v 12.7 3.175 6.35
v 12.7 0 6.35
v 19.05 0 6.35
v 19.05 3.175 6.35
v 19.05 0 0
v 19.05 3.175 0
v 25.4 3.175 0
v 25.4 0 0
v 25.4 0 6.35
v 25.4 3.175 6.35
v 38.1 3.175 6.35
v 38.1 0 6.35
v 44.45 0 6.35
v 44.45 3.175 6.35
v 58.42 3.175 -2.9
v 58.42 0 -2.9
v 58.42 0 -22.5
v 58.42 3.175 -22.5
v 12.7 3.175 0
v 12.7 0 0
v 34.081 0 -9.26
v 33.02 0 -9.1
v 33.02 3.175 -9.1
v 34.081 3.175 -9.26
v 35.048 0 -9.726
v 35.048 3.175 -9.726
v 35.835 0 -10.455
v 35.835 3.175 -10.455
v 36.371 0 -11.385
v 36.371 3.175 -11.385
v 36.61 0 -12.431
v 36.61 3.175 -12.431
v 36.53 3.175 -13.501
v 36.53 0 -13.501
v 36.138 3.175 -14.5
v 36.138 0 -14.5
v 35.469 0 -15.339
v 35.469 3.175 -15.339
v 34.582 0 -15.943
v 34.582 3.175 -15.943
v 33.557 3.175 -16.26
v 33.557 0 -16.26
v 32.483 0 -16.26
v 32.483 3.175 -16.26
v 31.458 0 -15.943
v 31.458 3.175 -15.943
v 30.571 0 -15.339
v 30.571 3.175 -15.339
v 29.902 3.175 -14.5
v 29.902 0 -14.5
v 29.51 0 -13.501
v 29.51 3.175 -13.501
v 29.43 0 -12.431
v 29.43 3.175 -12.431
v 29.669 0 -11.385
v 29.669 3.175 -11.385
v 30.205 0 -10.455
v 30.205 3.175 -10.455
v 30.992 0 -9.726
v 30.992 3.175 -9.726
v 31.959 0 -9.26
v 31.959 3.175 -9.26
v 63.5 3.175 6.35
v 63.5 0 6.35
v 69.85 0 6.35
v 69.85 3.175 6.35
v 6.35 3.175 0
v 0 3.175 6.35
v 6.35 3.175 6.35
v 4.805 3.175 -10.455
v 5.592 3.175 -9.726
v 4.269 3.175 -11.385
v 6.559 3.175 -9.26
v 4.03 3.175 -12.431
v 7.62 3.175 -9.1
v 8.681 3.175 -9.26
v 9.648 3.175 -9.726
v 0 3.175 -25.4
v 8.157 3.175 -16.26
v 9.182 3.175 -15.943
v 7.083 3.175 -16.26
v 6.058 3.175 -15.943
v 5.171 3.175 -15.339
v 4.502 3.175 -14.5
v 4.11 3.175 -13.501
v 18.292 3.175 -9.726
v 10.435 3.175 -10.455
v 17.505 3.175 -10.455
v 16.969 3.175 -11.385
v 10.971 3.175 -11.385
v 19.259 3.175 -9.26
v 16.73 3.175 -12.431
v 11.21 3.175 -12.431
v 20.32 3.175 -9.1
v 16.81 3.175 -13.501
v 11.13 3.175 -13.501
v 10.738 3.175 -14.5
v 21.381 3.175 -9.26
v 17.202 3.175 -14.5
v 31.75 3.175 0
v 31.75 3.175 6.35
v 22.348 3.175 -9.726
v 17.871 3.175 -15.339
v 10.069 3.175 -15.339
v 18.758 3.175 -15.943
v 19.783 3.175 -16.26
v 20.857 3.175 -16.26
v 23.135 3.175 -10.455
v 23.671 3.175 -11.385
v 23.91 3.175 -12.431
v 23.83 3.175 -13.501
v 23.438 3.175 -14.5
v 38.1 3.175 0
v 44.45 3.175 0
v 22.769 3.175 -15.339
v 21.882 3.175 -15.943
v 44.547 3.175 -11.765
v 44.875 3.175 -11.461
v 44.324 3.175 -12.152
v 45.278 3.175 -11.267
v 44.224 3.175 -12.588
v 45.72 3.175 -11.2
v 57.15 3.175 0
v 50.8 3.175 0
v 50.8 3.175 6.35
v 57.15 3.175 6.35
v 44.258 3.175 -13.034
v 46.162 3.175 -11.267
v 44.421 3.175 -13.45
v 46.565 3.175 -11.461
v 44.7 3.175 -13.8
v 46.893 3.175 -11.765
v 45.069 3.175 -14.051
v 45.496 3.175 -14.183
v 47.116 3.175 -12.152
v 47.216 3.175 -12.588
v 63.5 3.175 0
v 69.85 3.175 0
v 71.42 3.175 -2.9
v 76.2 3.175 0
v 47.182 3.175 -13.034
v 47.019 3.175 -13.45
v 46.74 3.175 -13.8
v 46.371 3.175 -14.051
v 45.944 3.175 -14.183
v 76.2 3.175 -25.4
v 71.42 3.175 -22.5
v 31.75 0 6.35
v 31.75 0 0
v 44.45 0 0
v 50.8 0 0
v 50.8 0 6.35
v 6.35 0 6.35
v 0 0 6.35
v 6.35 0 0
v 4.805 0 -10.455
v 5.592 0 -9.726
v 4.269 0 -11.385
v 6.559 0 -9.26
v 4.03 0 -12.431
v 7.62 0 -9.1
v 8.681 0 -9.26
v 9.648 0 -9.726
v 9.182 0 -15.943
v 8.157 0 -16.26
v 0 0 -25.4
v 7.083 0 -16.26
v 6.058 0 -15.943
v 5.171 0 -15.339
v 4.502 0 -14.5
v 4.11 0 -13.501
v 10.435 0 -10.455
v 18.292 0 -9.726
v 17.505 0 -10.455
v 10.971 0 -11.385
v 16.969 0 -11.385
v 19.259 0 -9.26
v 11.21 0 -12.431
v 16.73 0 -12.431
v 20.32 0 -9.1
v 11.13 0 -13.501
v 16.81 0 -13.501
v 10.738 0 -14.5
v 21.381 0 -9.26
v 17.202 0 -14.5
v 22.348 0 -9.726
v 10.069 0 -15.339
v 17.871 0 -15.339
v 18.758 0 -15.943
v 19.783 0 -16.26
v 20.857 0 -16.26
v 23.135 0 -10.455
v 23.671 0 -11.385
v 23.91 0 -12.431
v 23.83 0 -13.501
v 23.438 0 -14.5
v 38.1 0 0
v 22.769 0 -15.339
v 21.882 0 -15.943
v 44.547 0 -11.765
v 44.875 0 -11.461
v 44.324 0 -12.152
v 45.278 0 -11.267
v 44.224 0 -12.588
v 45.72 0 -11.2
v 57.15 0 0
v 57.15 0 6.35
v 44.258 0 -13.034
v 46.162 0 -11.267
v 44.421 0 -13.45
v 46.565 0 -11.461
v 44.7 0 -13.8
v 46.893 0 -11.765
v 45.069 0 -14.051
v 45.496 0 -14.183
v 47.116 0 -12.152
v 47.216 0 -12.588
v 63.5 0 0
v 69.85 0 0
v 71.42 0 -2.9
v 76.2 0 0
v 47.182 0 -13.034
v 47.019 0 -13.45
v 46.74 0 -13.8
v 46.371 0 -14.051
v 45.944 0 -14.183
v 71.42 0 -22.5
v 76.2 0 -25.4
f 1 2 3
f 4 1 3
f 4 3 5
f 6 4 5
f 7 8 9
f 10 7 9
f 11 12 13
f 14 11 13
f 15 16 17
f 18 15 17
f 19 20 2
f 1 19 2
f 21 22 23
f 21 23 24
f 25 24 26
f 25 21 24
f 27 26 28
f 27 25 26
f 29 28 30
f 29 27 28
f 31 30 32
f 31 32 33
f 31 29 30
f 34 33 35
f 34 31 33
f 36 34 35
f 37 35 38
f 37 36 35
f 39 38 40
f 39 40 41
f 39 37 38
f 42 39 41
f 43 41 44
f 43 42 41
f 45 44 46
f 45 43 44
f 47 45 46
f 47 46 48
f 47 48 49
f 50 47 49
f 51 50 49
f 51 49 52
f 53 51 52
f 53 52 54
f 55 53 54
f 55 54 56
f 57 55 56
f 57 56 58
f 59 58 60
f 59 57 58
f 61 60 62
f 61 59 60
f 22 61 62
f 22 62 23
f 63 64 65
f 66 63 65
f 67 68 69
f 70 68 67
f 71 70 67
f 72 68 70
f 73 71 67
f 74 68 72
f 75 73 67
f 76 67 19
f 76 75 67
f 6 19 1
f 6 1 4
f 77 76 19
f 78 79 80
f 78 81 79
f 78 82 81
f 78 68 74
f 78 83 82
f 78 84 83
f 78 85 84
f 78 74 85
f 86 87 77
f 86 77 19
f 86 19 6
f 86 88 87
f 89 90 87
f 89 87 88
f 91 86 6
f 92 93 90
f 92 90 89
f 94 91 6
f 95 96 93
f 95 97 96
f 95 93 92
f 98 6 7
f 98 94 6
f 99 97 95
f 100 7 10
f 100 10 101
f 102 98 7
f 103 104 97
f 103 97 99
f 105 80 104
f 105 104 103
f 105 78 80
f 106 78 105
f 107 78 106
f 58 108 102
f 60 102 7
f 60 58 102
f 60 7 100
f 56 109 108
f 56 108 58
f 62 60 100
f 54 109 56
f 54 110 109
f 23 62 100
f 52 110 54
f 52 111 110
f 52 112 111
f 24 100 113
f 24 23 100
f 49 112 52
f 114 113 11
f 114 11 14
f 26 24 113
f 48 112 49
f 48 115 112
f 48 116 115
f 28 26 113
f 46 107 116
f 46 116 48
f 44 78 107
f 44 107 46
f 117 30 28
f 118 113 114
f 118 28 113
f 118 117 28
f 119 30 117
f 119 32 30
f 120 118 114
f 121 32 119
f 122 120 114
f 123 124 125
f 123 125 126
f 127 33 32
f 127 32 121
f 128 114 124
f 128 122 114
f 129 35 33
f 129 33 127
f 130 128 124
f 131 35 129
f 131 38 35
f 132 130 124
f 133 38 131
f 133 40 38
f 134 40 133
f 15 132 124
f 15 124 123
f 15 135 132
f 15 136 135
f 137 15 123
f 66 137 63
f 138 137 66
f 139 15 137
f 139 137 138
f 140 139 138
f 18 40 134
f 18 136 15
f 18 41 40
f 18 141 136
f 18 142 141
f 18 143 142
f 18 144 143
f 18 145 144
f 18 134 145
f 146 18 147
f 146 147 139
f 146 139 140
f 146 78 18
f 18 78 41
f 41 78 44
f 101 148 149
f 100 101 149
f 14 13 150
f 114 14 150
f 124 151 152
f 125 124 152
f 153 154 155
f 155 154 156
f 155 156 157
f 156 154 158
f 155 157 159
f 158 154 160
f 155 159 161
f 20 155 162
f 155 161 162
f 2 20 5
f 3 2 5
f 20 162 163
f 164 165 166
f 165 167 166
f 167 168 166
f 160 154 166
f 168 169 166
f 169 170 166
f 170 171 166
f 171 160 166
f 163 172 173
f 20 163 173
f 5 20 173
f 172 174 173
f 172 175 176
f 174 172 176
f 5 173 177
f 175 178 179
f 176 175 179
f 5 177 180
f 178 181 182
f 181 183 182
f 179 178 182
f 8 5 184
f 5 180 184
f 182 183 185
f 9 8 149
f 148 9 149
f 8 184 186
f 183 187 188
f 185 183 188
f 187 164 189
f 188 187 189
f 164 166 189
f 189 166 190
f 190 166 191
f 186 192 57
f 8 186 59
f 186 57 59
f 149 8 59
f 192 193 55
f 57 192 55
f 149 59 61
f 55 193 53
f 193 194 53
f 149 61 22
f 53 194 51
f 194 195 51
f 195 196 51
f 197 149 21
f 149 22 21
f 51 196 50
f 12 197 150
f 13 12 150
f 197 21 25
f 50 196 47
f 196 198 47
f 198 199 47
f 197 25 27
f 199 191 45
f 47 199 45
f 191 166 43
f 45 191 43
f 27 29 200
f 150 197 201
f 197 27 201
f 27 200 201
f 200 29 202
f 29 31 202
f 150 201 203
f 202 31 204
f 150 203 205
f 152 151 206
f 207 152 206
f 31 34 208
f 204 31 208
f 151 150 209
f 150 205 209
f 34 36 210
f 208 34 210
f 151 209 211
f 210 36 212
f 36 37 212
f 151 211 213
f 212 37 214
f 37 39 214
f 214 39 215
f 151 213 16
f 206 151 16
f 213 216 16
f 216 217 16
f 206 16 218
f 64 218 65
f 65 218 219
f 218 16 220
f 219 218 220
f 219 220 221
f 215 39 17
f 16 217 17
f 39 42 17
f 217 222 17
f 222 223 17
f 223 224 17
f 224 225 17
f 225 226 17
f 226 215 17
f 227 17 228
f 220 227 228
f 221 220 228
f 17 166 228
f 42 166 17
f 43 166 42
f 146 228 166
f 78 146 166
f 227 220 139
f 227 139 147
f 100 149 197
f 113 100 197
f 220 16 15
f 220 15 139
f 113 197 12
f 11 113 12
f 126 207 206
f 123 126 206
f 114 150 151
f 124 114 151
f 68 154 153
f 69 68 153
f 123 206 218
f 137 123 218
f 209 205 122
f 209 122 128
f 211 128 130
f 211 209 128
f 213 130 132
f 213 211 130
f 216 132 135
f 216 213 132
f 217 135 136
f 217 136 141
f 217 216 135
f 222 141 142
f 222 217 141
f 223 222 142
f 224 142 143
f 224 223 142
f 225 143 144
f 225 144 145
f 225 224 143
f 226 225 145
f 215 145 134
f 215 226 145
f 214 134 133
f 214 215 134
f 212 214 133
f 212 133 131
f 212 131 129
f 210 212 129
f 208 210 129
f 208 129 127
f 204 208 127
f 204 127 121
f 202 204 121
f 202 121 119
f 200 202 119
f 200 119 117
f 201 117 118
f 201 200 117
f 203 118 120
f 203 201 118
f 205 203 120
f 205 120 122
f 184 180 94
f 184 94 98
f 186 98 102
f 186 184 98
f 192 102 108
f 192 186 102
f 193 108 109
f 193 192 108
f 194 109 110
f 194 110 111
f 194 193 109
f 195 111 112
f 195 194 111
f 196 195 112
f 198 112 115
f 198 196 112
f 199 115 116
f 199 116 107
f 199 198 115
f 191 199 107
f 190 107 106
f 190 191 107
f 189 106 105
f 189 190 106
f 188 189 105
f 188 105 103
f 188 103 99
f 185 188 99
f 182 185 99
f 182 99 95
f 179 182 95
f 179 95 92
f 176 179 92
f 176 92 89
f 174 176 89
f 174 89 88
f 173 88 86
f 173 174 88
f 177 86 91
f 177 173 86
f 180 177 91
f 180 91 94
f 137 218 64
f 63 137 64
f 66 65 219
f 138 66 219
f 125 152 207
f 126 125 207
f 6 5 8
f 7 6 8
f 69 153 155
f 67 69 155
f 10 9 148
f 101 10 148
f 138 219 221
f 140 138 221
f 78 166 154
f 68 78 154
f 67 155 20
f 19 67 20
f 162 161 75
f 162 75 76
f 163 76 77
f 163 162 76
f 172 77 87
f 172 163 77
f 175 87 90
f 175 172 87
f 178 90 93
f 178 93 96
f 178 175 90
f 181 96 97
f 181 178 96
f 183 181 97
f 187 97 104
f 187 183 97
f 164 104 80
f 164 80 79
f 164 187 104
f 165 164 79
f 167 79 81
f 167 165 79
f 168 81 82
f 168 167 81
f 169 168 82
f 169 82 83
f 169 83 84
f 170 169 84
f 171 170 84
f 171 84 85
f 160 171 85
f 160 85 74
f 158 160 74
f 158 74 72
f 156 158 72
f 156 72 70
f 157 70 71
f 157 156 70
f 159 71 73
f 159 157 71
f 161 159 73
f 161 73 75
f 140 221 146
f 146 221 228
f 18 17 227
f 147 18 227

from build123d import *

# Parameters (mm, degrees)
SKETCH1_R           = 3.6
SKETCH1_R_2         = 1.5
SKETCH1_W           = 13
SKETCH1_H           = 19.6
BOSS_EXTRUDE1_DEPTH = 3.175


with BuildPart() as part:
    # Sketch1 → Boss-Extrude1 (new body)
    with BuildSketch(Plane(origin=(0, 0, 0), x_dir=(1, 0, 0), z_dir=(0, 1, 0))):
        Polygon((0, 0), (0, -6.35), (6.35, -6.35), (6.35, 0), (12.7, 0), (12.7, -6.35), (19.05, -6.35), (19.05, 0), (25.4, 0), (25.4, -6.35), (31.75, -6.35), (31.75, 0), (38.1, 0), (38.1, -6.35), (44.45, -6.35), (44.45, 0), (50.8, 0), (50.8, -6.35), (57.15, -6.35), (57.15, 0), (63.5, 0), (63.5, -6.35), (69.85, -6.35), (69.85, 0), (76.2, 0), (76.2, 25.4), (0, 25.4), align=None)
        with Locations(Location((7.62, 12.7, 0), (0, 0, 270))):
            Circle(SKETCH1_R, mode=Mode.SUBTRACT)
        with Locations(Location((20.32, 12.7, 0), (0, 0, 270))):
            Circle(SKETCH1_R, mode=Mode.SUBTRACT)
        with Locations(Location((33.02, 12.7, 0), (0, 0, 270))):
            Circle(SKETCH1_R, mode=Mode.SUBTRACT)
        with Locations(Location((45.72, 12.7, 0), (0, 0, 270))):
            Circle(SKETCH1_R_2, mode=Mode.SUBTRACT)
        with Locations((64.92, 12.7)):
            Rectangle(SKETCH1_W, SKETCH1_H, mode=Mode.SUBTRACT)
    extrude(amount=BOSS_EXTRUDE1_DEPTH)


solid = part.part
